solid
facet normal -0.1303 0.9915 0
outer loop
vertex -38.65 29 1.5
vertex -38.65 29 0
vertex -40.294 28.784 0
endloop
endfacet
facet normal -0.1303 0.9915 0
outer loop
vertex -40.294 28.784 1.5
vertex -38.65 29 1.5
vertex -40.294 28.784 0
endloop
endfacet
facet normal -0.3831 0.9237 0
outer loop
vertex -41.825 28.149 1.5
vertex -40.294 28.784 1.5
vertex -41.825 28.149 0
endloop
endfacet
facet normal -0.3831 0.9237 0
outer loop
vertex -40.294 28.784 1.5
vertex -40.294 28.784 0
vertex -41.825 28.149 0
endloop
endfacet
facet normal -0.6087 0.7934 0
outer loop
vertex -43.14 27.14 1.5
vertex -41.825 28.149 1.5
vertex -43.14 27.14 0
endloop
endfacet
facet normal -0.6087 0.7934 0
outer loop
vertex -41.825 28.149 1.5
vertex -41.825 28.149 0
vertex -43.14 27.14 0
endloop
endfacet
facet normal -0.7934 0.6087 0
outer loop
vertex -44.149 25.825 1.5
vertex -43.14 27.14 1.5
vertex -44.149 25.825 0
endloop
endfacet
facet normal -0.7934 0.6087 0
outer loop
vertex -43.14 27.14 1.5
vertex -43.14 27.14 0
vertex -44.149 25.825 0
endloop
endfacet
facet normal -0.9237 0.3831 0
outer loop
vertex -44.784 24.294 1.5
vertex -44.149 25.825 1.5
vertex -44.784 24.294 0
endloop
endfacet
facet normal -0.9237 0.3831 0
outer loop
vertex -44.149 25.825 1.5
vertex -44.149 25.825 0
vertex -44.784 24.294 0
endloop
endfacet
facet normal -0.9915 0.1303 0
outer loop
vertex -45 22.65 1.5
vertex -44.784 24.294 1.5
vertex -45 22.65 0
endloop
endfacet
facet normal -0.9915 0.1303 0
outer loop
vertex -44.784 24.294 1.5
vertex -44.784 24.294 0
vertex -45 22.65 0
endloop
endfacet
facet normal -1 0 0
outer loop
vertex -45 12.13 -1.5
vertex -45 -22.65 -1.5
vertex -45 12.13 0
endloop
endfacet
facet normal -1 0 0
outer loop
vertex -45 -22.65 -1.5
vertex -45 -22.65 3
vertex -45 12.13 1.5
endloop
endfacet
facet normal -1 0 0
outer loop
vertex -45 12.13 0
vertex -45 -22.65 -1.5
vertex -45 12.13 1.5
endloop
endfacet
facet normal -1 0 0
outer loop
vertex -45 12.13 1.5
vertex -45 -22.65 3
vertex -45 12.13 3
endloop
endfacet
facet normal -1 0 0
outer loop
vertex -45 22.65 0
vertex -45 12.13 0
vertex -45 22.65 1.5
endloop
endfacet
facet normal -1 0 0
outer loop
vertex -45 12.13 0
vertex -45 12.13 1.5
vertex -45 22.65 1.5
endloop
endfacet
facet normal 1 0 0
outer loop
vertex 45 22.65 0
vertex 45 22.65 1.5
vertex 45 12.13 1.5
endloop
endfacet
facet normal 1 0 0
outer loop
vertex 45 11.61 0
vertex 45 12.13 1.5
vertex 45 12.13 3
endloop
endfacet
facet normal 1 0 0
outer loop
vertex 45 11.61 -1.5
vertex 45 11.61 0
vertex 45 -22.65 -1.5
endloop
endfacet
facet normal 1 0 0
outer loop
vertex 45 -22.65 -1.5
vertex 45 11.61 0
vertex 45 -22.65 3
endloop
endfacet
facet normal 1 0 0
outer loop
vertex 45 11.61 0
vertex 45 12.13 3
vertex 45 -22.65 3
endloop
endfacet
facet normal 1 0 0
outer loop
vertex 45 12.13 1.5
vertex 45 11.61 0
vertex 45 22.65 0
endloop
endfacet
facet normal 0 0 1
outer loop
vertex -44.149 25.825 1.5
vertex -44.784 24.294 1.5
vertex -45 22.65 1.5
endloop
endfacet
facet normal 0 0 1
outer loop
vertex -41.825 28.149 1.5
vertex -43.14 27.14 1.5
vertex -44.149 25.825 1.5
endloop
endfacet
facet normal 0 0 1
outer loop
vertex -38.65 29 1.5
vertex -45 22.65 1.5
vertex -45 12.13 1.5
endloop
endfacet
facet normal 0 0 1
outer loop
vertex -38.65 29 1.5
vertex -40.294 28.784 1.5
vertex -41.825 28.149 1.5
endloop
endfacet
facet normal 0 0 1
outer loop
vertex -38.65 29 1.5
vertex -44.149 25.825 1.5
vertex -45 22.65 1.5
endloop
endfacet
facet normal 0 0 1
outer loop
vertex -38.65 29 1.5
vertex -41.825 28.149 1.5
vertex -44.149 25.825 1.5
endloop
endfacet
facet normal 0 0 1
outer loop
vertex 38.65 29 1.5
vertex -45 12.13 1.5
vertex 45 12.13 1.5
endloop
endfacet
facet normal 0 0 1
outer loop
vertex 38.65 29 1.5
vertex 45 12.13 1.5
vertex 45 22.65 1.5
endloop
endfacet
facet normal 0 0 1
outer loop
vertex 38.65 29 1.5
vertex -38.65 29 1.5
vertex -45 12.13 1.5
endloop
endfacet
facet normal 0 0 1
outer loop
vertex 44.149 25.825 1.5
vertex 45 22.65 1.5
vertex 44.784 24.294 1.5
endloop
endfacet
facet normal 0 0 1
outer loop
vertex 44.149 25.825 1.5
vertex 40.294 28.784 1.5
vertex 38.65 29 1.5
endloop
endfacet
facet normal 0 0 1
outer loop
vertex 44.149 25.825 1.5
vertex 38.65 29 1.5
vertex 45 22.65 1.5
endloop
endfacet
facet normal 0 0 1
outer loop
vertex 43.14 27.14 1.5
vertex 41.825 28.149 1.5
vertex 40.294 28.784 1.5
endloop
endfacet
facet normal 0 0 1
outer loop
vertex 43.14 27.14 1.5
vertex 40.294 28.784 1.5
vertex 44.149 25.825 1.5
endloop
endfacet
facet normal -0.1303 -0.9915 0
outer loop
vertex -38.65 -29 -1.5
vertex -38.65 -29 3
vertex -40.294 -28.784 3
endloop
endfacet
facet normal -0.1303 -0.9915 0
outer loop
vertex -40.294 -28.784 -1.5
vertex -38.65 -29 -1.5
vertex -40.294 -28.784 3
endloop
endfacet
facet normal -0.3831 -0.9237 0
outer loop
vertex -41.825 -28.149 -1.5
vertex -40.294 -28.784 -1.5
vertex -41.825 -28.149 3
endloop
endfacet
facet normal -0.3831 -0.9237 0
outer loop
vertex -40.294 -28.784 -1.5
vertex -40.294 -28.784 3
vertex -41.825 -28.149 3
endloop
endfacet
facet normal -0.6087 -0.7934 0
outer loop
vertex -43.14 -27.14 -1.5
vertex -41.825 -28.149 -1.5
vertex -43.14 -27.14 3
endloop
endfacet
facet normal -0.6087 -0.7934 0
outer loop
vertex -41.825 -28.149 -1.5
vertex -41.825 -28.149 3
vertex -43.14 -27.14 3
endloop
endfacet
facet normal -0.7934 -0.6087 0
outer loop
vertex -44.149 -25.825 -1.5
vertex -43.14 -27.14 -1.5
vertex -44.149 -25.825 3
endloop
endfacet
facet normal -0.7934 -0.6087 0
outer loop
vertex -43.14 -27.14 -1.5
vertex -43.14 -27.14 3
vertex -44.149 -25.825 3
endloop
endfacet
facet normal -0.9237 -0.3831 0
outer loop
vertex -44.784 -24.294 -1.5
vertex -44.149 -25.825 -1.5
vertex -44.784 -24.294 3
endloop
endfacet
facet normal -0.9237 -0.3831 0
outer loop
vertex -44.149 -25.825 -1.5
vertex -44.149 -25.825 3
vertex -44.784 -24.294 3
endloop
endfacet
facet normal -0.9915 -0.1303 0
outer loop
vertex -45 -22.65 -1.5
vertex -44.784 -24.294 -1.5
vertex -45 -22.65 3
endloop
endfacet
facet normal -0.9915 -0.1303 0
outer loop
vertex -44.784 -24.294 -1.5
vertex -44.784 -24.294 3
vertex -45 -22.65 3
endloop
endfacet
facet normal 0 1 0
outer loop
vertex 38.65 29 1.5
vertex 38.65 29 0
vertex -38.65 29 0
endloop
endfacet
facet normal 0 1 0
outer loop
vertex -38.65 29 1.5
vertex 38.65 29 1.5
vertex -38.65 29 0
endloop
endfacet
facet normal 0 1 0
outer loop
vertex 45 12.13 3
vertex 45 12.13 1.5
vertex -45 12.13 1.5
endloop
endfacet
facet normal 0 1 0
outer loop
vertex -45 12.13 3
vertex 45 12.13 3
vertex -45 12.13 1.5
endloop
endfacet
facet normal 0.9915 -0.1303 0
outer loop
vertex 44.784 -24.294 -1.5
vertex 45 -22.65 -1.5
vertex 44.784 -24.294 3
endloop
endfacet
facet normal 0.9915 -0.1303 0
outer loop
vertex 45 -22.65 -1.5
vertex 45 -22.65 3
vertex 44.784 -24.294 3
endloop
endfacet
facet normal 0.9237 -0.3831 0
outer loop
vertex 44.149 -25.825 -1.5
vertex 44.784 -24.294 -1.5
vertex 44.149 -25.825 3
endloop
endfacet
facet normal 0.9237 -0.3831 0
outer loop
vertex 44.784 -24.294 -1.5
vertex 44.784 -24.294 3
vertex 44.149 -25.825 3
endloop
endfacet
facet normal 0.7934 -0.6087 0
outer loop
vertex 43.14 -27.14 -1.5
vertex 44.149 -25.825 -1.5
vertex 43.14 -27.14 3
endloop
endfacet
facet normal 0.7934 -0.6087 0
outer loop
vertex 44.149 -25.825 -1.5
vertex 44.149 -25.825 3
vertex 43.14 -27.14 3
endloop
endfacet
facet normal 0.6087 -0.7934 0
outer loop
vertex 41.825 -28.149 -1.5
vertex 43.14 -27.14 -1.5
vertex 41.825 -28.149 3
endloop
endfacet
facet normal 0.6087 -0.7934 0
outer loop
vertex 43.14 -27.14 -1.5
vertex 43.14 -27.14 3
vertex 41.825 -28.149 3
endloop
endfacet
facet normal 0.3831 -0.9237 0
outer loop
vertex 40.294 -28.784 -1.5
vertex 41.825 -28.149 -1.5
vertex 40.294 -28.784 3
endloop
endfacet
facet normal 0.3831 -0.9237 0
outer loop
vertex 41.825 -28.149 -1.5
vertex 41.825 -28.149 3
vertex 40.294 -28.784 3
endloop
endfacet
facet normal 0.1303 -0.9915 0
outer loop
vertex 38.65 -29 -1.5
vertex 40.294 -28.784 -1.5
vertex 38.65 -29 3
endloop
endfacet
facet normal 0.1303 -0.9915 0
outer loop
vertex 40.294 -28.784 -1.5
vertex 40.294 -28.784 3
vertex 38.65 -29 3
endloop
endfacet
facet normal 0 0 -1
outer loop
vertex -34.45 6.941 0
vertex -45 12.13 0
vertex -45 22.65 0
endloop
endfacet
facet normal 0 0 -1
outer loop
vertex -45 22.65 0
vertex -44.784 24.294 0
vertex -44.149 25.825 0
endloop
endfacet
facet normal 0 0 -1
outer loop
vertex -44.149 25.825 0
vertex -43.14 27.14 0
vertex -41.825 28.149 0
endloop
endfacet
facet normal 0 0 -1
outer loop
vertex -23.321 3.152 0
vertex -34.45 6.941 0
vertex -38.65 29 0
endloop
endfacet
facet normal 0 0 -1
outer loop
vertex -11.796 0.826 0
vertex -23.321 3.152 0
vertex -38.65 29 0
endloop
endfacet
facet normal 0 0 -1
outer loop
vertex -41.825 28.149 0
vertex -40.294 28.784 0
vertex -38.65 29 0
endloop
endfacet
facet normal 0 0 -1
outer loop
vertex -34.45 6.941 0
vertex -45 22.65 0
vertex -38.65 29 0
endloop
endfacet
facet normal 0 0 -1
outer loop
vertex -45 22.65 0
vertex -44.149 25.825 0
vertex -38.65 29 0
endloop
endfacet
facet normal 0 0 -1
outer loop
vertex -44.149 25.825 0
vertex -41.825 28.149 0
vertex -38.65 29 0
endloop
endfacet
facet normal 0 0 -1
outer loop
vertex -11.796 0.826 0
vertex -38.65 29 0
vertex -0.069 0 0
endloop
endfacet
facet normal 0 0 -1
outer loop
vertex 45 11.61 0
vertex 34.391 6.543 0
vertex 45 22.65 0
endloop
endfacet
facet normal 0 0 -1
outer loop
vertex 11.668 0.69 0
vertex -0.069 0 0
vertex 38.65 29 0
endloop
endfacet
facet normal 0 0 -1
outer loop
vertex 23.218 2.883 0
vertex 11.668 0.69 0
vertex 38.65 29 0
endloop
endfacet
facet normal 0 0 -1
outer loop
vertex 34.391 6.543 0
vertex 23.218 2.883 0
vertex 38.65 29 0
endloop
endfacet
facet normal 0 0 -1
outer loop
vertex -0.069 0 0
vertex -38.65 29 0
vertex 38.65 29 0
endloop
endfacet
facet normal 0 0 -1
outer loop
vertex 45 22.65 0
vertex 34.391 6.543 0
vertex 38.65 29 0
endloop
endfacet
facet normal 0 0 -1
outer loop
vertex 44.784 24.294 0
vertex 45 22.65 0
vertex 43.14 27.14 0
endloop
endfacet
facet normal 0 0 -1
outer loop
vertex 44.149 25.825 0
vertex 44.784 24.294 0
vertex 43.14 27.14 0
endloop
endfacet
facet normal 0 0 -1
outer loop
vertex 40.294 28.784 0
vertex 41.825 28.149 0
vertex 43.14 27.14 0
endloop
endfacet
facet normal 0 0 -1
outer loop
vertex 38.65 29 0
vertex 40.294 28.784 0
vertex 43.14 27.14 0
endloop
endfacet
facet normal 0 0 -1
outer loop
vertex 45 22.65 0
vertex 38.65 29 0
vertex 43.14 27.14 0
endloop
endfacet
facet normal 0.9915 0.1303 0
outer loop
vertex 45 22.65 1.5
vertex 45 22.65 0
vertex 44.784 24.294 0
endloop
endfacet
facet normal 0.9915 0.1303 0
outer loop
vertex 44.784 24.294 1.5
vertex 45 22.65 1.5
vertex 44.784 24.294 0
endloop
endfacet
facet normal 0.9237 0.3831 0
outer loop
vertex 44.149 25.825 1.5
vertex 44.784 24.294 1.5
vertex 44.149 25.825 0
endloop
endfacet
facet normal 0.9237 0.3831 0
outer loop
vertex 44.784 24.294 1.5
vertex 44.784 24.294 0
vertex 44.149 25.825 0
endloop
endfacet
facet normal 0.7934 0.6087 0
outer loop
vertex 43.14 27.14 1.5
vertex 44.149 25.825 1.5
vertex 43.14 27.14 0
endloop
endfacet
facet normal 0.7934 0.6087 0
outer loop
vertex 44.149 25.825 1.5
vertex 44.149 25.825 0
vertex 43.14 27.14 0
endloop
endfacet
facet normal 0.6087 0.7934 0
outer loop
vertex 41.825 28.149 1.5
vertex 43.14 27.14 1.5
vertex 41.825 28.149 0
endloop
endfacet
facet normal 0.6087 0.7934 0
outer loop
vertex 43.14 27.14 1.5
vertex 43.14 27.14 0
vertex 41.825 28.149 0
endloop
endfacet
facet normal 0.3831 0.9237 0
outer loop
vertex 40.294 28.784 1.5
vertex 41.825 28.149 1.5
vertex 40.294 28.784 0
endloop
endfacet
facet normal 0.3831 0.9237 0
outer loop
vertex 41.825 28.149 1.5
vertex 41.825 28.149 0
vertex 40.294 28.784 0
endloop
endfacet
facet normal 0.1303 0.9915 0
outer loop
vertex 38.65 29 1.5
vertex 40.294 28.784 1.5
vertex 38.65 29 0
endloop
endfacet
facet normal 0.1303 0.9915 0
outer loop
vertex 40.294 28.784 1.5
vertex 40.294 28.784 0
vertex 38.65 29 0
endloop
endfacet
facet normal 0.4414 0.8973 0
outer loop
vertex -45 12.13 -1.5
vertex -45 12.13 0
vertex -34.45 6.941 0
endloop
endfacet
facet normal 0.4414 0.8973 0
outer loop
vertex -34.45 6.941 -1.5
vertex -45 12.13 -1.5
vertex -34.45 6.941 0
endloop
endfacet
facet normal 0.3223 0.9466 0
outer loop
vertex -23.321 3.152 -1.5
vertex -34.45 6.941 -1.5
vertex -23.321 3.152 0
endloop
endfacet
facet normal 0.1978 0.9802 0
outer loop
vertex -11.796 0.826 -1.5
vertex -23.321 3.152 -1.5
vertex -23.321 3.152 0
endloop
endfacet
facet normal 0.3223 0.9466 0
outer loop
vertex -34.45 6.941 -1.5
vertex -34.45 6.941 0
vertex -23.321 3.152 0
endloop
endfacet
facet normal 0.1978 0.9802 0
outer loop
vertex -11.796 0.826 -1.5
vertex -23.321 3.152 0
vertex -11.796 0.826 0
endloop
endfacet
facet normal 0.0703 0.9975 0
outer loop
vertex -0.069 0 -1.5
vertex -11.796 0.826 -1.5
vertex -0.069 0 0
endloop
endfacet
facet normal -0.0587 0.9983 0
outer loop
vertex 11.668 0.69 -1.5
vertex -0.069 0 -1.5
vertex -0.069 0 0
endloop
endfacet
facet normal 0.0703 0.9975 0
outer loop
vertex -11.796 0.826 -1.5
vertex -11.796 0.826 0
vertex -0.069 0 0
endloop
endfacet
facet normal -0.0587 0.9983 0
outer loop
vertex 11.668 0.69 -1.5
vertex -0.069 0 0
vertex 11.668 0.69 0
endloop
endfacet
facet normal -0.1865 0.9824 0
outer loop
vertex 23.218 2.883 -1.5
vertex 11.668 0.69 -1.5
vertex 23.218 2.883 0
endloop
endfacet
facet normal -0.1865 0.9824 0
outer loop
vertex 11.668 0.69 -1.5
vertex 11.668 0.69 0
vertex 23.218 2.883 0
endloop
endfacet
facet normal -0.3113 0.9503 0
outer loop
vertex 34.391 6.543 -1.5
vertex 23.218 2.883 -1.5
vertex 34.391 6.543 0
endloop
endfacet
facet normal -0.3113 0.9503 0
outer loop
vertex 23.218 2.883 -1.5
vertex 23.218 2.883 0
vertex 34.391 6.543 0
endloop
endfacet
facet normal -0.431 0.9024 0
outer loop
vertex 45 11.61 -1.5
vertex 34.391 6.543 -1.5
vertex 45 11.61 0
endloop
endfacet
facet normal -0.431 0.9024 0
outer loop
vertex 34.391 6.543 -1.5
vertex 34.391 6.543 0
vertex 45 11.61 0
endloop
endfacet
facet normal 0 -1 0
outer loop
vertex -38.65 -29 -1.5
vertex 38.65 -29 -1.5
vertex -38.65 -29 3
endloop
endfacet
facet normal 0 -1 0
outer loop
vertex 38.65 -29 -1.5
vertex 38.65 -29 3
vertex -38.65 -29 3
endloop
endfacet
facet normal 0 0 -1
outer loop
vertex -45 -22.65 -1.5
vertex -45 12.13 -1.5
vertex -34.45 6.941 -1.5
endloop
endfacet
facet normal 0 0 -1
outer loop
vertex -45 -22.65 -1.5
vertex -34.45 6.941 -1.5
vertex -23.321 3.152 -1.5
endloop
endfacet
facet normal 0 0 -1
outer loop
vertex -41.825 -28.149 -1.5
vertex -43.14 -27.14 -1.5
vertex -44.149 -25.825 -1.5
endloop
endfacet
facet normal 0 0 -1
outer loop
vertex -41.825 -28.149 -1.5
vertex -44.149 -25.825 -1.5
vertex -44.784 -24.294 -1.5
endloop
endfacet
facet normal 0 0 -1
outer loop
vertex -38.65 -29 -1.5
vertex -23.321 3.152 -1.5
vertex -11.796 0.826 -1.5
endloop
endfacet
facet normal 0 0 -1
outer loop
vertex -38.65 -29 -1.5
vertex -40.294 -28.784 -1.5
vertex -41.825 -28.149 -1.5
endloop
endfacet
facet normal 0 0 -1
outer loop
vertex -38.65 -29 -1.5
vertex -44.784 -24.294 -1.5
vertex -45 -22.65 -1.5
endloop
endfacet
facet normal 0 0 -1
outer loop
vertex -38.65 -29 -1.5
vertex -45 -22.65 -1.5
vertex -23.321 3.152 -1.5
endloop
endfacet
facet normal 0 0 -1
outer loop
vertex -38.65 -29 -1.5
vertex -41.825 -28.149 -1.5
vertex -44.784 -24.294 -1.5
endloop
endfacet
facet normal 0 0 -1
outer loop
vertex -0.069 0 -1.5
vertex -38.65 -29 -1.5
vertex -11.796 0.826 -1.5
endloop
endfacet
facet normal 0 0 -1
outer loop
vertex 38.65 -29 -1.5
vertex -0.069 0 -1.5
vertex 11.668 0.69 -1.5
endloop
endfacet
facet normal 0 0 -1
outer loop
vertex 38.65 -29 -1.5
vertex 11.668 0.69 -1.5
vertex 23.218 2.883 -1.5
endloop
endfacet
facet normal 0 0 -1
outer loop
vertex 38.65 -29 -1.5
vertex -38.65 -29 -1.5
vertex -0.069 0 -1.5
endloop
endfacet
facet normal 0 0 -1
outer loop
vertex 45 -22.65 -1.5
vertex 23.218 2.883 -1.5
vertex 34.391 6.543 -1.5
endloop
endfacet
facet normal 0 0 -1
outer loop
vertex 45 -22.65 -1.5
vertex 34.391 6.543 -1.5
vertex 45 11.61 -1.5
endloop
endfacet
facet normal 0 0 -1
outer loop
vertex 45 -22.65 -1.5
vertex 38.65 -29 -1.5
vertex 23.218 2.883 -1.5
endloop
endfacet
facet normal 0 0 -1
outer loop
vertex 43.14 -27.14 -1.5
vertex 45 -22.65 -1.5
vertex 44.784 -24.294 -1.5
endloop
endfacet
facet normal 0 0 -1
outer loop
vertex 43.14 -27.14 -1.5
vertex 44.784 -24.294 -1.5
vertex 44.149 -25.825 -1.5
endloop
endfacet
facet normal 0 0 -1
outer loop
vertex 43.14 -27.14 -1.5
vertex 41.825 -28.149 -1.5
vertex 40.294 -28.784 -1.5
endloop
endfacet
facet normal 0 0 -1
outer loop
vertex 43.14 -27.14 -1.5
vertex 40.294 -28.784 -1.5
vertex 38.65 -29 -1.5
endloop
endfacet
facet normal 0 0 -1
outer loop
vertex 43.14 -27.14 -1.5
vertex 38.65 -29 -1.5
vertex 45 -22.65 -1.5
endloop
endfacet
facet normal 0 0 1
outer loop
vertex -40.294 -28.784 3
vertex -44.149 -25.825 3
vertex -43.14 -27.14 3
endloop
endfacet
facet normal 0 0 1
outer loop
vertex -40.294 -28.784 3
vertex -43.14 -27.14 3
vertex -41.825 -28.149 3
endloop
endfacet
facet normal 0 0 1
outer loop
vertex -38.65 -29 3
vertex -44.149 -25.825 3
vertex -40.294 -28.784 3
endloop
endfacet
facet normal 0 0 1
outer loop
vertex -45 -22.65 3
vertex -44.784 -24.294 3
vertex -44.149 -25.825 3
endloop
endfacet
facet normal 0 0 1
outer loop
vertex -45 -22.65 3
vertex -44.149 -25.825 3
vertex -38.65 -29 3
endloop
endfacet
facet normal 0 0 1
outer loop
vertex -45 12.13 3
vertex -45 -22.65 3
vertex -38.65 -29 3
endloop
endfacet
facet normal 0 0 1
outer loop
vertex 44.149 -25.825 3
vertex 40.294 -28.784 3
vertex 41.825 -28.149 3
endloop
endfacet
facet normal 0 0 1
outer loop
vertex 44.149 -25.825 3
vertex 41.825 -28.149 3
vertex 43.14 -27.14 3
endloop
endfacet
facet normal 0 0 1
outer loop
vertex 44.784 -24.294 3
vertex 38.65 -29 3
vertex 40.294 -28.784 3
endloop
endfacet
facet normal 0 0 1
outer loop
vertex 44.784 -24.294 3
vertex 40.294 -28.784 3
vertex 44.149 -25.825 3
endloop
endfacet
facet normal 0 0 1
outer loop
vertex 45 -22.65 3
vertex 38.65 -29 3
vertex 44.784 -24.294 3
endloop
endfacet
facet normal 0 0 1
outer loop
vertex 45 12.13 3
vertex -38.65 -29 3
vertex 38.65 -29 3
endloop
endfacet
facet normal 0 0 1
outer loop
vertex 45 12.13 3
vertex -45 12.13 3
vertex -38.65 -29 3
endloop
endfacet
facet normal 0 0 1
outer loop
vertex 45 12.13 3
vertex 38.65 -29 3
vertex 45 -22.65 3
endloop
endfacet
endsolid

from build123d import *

# Parameters (mm, degrees)
F1_DEPTH = 1.5
F3_DEPTH = 1.5
F5_DEPTH = 1.5


with BuildPart() as f1:
    # F0 (on Top) → F1 (new body)
    with BuildSketch(Plane.XY):
        with BuildLine():
            Line((-38.65, -29), (38.65, -29))
            ThreePointArc((38.65, -29), (43.140128, -27.140128), (45, -22.65))
            Line((45, -22.65), (45, 22.65))
            ThreePointArc((45, 22.65), (43.140128, 27.140128), (38.65, 29))
            Line((38.65, 29), (-38.65, 29))
            ThreePointArc((-38.65, 29), (-43.140128, 27.140128), (-45, 22.65))
            Line((-45, 22.65), (-45, -22.65))
            ThreePointArc((-45, -22.65), (-43.140128, -27.140128), (-38.65, -29))
        make_face()
    extrude(amount=F1_DEPTH)

    # F2 (on face) → F3 (join)
    with BuildSketch(Plane.XY.offset(1.5)):
        with BuildLine():
            ThreePointArc((38.65, -29), (43.140128, -27.140128), (45, -22.65))
            Line((45, -22.65), (45, 12.129959))
            Line((45, 12.129959), (-45, 12.129959))
            Line((-45, 12.129959), (-45, -22.65))
            ThreePointArc((-45, -22.65), (-43.140128, -27.140128), (-38.65, -29))
            Line((-38.65, -29), (38.65, -29))
        make_face()
    extrude(amount=F3_DEPTH)

    # F4 (on face) → F5 (join)
    with BuildSketch(Plane(origin=(0, 0, 0), x_dir=(1, 0, 0), z_dir=(0, 0, -1))):
        with BuildLine():
            ThreePointArc((-45, -12.129959), (-0.068582, -0.00037), (45, -11.609941))
            Line((45, -11.609941), (45, 22.65))
            ThreePointArc((45, 22.65), (43.140128, 27.140128), (38.65, 29))
            Line((38.65, 29), (-38.65, 29))
            ThreePointArc((-38.65, 29), (-43.140128, 27.140128), (-45, 22.65))
            Line((-45, 22.65), (-45, -12.129959))
        make_face()
    extrude(amount=F5_DEPTH)


solid = f1.part
